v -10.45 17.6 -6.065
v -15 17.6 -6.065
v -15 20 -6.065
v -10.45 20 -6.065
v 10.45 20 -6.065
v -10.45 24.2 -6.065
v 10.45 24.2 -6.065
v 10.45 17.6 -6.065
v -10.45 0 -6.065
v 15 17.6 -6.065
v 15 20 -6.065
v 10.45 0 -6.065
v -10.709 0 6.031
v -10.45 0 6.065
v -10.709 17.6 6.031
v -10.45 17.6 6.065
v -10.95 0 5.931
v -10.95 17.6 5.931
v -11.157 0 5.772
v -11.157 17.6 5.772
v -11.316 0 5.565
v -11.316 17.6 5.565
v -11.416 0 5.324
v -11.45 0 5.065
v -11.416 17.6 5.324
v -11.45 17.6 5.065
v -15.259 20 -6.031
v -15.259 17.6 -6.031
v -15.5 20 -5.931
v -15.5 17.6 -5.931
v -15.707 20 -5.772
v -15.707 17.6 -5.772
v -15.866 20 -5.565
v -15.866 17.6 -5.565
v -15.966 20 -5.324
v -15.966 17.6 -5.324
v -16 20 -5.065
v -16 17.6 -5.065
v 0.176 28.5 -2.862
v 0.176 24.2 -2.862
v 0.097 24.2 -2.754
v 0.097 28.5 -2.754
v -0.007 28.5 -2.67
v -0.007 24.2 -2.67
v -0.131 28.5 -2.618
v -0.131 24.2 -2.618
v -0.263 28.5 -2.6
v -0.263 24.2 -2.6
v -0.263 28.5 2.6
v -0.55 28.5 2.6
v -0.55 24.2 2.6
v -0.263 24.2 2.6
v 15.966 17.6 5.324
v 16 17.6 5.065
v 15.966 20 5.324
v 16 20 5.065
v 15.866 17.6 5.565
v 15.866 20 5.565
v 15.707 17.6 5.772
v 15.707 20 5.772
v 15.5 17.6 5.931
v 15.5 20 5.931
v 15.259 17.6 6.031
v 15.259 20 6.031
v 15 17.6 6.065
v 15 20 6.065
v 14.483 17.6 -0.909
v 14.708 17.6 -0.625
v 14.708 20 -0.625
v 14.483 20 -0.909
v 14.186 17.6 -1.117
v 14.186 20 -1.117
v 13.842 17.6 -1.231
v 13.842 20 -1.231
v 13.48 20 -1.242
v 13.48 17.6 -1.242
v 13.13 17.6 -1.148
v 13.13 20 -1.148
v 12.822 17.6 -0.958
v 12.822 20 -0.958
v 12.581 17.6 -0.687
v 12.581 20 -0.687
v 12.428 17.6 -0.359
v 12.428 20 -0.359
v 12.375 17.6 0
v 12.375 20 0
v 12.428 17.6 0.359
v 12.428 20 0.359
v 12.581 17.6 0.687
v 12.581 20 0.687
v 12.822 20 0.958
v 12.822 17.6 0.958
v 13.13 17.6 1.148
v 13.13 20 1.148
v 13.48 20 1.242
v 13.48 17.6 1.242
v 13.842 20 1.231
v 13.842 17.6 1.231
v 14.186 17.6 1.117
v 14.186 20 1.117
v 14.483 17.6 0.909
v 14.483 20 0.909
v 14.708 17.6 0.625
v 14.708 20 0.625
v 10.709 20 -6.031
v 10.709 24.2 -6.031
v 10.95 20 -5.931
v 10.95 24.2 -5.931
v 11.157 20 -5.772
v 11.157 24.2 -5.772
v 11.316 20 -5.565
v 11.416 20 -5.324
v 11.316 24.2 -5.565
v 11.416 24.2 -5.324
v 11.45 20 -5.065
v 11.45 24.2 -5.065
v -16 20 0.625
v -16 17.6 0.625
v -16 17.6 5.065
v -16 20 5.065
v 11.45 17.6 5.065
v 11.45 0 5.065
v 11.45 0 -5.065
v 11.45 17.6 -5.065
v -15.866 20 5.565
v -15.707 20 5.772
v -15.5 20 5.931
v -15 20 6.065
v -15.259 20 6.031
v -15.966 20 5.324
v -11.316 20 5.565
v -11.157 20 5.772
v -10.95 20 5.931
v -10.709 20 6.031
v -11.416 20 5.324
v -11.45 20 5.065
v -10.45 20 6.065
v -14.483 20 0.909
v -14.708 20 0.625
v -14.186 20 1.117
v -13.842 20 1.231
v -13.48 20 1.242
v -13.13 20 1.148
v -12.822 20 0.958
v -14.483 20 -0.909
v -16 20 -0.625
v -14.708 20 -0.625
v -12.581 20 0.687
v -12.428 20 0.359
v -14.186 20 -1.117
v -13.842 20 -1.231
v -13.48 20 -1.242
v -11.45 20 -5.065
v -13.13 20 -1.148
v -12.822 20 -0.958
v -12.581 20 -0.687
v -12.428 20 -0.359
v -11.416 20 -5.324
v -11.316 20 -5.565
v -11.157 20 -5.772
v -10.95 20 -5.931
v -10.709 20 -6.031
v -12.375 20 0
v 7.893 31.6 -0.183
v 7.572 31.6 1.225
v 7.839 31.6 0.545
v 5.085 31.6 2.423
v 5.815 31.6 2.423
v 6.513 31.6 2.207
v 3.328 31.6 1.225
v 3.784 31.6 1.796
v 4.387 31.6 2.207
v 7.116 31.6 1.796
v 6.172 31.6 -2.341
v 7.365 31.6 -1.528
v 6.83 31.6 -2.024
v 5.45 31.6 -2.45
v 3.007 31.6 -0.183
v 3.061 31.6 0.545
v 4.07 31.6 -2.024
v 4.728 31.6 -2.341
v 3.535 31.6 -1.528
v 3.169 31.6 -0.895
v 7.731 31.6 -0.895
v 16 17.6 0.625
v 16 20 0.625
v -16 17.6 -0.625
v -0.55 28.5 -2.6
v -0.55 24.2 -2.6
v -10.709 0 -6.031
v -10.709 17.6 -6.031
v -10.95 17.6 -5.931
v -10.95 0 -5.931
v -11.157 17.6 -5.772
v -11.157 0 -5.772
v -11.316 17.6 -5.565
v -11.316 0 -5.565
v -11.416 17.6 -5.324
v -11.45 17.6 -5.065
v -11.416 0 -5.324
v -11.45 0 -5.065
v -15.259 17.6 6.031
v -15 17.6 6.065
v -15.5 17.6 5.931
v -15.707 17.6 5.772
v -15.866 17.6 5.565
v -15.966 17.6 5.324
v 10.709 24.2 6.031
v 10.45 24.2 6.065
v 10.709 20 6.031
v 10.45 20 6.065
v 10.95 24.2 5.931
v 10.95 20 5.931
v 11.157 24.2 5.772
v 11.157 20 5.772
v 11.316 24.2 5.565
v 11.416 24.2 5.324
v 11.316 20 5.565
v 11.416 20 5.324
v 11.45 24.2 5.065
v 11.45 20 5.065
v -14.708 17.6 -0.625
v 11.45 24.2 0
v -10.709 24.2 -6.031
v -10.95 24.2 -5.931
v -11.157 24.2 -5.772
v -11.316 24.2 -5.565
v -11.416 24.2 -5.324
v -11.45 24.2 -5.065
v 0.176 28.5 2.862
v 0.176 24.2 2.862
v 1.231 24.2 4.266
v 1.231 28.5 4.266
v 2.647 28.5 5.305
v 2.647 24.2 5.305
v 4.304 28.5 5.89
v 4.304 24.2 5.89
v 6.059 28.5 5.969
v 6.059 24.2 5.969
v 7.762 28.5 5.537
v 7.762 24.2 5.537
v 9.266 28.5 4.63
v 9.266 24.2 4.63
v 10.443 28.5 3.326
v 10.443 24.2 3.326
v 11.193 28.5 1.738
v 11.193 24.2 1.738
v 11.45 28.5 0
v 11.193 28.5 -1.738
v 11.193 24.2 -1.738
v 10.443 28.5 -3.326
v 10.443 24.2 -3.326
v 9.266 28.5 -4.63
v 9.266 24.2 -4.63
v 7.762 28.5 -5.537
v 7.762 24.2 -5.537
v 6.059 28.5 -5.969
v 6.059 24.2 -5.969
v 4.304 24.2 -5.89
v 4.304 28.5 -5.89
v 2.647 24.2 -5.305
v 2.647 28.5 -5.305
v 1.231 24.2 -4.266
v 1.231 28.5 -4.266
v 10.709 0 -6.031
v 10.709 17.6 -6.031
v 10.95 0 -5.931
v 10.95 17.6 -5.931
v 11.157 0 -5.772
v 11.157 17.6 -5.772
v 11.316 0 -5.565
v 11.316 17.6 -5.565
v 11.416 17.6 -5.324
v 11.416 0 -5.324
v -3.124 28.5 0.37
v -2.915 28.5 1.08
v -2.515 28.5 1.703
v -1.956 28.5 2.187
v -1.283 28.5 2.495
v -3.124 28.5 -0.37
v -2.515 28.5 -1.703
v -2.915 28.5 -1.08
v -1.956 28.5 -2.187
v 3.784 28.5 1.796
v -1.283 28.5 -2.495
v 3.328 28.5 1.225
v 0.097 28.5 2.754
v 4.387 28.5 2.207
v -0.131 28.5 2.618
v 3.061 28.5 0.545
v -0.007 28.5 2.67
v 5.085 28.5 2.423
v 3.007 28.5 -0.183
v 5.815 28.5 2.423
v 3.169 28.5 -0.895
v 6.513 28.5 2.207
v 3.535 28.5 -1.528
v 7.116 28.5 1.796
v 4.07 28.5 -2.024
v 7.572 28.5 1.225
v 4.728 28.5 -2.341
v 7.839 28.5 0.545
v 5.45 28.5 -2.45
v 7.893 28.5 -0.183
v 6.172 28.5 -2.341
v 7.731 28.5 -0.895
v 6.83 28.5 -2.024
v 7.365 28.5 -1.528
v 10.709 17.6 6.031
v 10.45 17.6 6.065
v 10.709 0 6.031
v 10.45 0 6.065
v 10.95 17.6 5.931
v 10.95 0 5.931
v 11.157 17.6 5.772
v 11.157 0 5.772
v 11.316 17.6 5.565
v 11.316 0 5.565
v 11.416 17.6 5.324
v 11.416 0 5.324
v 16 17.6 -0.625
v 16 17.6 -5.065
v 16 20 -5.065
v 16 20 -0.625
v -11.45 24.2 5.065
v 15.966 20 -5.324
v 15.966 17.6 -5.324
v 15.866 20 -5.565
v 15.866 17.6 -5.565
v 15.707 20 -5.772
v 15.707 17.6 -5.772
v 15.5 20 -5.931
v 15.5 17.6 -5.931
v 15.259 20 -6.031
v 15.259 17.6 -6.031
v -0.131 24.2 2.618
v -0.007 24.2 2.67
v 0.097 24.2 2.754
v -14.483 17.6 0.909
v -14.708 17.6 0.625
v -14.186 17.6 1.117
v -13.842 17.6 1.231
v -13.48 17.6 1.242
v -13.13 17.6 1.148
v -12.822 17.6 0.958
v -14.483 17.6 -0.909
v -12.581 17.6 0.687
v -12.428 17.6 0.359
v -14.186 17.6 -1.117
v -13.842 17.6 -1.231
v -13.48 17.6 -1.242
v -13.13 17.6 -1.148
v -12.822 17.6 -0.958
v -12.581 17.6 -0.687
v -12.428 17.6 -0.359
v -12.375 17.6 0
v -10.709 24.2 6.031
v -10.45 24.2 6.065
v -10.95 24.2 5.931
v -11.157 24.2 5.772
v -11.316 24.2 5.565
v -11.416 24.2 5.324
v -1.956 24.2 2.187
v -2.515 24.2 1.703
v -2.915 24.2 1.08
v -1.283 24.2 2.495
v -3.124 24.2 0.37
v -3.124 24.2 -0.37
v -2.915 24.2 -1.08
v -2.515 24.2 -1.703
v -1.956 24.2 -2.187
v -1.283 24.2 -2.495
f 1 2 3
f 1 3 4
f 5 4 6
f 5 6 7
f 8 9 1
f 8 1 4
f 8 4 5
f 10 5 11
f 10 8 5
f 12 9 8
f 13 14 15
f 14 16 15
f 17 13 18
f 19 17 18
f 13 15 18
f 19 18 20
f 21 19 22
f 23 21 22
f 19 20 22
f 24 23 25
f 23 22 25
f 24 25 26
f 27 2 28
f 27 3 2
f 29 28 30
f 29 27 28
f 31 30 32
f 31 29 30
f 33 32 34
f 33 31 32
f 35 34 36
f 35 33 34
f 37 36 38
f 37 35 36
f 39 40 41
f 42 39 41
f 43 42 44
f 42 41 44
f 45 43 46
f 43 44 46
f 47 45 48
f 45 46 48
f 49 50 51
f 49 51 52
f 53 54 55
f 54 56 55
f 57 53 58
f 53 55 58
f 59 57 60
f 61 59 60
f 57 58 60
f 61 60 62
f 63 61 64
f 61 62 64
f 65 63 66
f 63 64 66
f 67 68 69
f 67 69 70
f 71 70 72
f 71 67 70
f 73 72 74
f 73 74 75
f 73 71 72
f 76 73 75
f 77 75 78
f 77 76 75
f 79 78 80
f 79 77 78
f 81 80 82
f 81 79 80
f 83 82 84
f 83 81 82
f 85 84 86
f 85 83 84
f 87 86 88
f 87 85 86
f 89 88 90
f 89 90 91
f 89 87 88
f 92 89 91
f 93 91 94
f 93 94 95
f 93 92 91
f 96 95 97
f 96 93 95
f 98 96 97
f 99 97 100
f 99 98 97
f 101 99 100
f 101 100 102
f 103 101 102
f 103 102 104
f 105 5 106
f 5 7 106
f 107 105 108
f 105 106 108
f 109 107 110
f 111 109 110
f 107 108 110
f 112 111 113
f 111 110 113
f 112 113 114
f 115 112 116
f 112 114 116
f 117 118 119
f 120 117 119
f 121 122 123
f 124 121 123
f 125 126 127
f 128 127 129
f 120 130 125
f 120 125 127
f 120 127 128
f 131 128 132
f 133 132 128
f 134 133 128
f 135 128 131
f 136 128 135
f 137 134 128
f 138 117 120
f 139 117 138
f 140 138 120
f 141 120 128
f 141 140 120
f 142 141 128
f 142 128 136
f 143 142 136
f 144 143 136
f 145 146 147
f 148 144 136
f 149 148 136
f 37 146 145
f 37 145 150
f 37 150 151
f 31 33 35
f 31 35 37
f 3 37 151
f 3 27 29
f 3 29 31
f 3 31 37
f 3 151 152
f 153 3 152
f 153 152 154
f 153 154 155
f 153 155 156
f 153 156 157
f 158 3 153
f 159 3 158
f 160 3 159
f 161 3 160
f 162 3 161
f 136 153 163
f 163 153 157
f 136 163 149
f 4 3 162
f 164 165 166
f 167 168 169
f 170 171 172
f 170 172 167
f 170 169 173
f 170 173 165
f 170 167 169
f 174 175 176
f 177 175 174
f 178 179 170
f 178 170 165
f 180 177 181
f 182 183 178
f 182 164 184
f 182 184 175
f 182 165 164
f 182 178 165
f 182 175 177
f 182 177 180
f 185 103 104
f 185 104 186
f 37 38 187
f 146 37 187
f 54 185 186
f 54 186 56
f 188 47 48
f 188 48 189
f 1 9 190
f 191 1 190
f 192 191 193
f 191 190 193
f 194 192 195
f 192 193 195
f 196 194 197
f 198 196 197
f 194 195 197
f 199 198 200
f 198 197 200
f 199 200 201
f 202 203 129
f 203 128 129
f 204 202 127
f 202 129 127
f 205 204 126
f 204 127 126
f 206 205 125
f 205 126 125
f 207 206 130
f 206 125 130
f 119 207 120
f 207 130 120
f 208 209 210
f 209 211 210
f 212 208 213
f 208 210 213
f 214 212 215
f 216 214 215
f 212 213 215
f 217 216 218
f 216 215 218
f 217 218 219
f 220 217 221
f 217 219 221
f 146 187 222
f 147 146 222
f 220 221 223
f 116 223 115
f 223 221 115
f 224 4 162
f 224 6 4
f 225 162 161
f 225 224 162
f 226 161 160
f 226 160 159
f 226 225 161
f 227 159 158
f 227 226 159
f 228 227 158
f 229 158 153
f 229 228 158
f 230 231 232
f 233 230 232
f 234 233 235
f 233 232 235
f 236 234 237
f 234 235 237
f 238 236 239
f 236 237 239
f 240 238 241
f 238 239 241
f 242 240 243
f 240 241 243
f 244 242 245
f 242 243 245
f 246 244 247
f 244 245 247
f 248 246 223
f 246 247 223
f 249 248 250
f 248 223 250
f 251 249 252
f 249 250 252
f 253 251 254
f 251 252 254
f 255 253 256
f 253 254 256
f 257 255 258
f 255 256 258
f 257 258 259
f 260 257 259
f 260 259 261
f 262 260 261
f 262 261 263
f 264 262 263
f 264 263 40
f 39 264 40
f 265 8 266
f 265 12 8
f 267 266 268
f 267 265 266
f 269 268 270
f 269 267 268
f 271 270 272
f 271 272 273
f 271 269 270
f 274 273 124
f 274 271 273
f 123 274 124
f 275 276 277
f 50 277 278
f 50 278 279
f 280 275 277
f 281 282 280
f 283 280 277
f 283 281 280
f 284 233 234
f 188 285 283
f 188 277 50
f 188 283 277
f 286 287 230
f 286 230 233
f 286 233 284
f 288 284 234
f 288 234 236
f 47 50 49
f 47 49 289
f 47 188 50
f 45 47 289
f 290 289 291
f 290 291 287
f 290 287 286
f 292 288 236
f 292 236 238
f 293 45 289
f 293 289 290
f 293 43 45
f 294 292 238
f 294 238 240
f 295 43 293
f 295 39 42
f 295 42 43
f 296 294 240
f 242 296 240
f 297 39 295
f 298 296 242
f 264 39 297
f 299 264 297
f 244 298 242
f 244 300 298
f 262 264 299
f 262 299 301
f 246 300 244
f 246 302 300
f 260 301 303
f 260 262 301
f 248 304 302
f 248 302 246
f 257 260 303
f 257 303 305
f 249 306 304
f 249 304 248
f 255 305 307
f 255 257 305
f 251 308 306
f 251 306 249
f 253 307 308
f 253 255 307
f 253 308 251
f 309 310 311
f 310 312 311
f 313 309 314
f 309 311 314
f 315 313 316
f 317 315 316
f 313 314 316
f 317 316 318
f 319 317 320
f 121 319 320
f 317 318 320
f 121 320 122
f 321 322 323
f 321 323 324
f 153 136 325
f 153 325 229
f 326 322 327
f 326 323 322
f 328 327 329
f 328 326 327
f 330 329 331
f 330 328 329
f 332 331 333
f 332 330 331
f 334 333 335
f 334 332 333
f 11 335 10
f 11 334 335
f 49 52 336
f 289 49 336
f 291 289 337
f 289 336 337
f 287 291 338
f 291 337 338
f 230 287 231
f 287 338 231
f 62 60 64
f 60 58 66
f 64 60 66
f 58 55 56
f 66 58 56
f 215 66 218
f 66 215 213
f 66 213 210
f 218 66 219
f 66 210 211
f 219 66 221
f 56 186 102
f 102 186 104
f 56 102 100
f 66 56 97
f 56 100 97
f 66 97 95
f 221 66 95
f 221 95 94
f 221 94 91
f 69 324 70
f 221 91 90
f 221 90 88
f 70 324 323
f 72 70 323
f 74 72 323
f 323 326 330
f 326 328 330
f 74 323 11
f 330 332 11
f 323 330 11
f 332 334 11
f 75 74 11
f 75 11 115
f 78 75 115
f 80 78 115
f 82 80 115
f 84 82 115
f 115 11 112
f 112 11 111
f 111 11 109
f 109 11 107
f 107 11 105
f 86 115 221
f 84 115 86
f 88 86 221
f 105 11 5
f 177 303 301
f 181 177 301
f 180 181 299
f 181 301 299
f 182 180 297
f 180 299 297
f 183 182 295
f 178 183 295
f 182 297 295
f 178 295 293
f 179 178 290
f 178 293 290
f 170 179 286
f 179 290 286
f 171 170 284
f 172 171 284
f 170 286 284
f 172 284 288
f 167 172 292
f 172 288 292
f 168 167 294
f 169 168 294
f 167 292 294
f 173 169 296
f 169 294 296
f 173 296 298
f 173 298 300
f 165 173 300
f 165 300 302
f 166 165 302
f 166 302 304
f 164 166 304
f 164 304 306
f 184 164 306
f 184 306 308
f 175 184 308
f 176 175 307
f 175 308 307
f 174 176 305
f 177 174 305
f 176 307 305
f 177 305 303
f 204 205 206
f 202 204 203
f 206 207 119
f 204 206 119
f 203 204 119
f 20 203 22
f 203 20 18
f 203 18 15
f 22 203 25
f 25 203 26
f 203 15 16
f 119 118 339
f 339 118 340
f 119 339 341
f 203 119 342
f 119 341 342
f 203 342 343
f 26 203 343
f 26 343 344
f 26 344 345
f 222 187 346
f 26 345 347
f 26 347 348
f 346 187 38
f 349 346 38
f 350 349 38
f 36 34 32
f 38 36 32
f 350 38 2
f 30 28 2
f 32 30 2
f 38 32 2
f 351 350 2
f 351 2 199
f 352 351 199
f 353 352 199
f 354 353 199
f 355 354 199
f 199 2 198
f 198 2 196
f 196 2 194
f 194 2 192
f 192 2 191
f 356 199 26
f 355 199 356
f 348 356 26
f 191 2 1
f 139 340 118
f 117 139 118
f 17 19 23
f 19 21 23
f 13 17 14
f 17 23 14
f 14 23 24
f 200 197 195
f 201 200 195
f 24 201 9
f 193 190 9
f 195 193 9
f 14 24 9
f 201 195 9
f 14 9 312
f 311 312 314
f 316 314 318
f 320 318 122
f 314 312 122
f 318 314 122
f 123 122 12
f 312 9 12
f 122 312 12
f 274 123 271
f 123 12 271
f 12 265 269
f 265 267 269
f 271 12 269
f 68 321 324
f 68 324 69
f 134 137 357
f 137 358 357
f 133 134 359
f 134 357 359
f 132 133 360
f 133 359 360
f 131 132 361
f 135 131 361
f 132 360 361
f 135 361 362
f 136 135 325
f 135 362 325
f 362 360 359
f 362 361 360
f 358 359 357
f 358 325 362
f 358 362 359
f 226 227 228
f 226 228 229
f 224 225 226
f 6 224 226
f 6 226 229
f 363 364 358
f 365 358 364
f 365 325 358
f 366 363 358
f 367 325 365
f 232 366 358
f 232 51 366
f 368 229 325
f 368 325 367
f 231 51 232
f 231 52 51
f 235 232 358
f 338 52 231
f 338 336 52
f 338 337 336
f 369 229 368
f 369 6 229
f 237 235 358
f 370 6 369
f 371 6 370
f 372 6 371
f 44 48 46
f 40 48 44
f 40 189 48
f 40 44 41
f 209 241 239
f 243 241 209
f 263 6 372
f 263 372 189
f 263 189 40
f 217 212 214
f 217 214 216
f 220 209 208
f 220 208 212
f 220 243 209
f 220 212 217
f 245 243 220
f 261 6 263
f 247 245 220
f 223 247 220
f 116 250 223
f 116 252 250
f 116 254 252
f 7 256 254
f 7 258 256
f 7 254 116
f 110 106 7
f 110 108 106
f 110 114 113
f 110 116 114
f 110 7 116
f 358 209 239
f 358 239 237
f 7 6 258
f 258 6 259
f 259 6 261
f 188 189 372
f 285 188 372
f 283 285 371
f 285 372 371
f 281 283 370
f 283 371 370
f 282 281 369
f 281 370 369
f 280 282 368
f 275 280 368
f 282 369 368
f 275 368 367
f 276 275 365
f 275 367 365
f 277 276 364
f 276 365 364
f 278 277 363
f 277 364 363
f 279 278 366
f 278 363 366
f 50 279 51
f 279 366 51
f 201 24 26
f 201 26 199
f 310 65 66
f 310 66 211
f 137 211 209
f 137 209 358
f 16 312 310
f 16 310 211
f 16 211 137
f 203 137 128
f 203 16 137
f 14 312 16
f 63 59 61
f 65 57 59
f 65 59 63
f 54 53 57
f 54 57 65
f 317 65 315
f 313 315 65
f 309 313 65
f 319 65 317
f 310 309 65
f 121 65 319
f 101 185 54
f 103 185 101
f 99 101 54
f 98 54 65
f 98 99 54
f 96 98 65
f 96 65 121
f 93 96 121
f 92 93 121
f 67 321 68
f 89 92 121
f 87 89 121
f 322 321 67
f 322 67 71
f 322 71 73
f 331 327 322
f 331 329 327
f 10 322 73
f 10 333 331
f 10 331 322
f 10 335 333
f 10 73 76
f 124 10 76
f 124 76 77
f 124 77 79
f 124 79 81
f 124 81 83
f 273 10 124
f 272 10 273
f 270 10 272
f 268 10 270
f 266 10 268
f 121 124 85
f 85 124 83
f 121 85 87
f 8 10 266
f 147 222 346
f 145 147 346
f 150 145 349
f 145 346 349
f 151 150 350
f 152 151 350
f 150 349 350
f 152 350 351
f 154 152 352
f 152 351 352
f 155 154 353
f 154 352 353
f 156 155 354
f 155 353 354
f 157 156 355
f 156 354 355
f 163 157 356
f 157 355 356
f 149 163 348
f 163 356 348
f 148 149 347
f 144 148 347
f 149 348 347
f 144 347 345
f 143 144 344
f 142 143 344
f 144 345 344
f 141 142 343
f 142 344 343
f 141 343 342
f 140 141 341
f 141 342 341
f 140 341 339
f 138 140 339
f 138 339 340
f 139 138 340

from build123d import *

# Parameters (mm, degrees)
ESBO_O2_W                  = 22.9
ESBO_O2_H                  = 12.13
RESSALTO_EXTRUS_O1_DEPTH   = 17.35
ESBO_O3_W                  = 32
ESBO_O3_H                  = 12.13
RESSALTO_EXTRUS_O2_DEPTH   = 2.4
ESBO_O4_W                  = 22.9
ESBO_O4_H                  = 12.13
RESSALTO_EXTRUS_O3_DEPTH   = 4.45
CORTE_EXTRUS_O1_DEPTH      = 2.4
RESSALTO_EXTRUS_O4_DEPTH   = 4.3
ESBO_O7_R                  = 2.45
RESSALTO_EXTRUS_O5_DEPTH   = 3.1
CORTE_EXTRUS_O2_DEPTH      = 1
CORTE_EXTRUS_O2_DEPTH_BACK = 16
ESBO_O10_W                 = 9.190370446
ESBO_O10_H                 = 13.482765879
ESBO_O10_W_2               = 7.294178248
ESBO_O10_H_2               = 14.557386271
RESSALTO_EXTRUS_O7_DEPTH   = 2.4
FILETE1_R                  = 1


with BuildPart() as part:
    # Esboço2 → Ressalto-extrusão1 (new body)
    with BuildSketch(Plane(origin=(0, 0, 0), x_dir=(1, 0, 0), z_dir=(0, 1, 0))):
        Rectangle(ESBO_O2_W, ESBO_O2_H)
    extrude(amount=RESSALTO_EXTRUS_O1_DEPTH)

    # Esboço3 → Ressalto-extrusão2 (add)
    with BuildSketch(Plane(origin=(0, 17.35, 0), x_dir=(1, 0, 0), z_dir=(0, 1, 0))):
        Rectangle(ESBO_O3_W, ESBO_O3_H)
    extrude(amount=RESSALTO_EXTRUS_O2_DEPTH)

    # Esboço4 → Ressalto-extrusão3 (add)
    with BuildSketch(Plane(origin=(0, 19.75, 0), x_dir=(1, 0, 0), z_dir=(0, 1, 0))):
        Rectangle(ESBO_O4_W, ESBO_O4_H)
    extrude(amount=RESSALTO_EXTRUS_O3_DEPTH)

    # Esboço5 → Corte-extrusão1 (cut)
    with BuildSketch(Plane(origin=(0, 19.75, 0), x_dir=(1, 0, 0), z_dir=(0, 1, 0))):
        with BuildLine():
            Line((-16, -0.625), (-16, 0.625))
            Line((-16, 0.625), (-14.707531755, 0.625))
            ThreePointArc((-14.707531755, 0.625), (-12.375, 0), (-14.707531755, -0.625))
            Line((-14.707531755, -0.625), (-16, -0.625))
        make_face()
        with BuildLine():
            Line((14.707531755, -0.625), (16, -0.625))
            Line((16, -0.625), (16, 0.625))
            Line((16, 0.625), (14.707531755, 0.625))
            ThreePointArc((14.707531755, 0.625), (12.375, 0), (14.707531755, -0.625))
        make_face()
    extrude(amount=-CORTE_EXTRUS_O1_DEPTH, mode=Mode.SUBTRACT)

    # Esboço6 → Ressalto-extrusão4 (add)
    with BuildSketch(Plane(origin=(0, 24.2, 0), x_dir=(1, 0, 0), z_dir=(0, 1, 0))):
        with BuildLine():
            Line((-0.55, -2.6), (-0.263142743, -2.6))
            ThreePointArc((-0.263142743, -2.6), (-0.007438587, -2.670331076), (0.176329776, -2.861538462))
            ThreePointArc((0.176329776, -2.861538462), (11.45, 0), (0.176329776, 2.861538462))
            ThreePointArc((0.176329776, 2.861538462), (-0.007438587, 2.670331076), (-0.263142743, 2.6))
            Line((-0.263142743, 2.6), (-0.55, 2.6))
            ThreePointArc((-0.55, 2.6), (-3.15, 0), (-0.55, -2.6))
        make_face()
    extrude(amount=RESSALTO_EXTRUS_O4_DEPTH)

    # Esboço7 → Ressalto-extrusão5 (add)
    with BuildSketch(Plane(origin=(0, 28.5, 0), x_dir=(1, 0, 0), z_dir=(0, 1, 0))):
        with Locations(Location((5.45, 0, 0), (0, 0, 90))):
            Circle(ESBO_O7_R)
    extrude(amount=RESSALTO_EXTRUS_O5_DEPTH)

    # Esboço10 → Corte-extrusão2 (cut, two sides: drawn at the far end of the back side and taken through both)
    with BuildSketch(Plane(origin=(0, 28.5, 0), x_dir=(1, 0, 0), z_dir=(0, 1, 0)).offset(-CORTE_EXTRUS_O2_DEPTH_BACK)):
        with Locations((16.045185223, -0.676382939)):
            Rectangle(ESBO_O10_W, ESBO_O10_H)
        with Locations((-15.097089124, -1.213693136)):
            Rectangle(ESBO_O10_W_2, ESBO_O10_H_2)
    extrude(amount=CORTE_EXTRUS_O2_DEPTH + CORTE_EXTRUS_O2_DEPTH_BACK, mode=Mode.SUBTRACT)

    # Esboço12 → Ressalto-extrusão7 (add)
    with BuildSketch(Plane(origin=(0, 17.6, 0), x_dir=(1, 0, 0), z_dir=(0, 1, 0))):
        with BuildLine():
            Line((16, 0.625), (14.707531755, 0.625))
            ThreePointArc((14.707531755, 0.625), (12.375, 0), (14.707531755, -0.625))
            Line((14.707531755, -0.625), (16, -0.625))
            Line((16, -0.625), (16, -6.065))
            Line((16, -6.065), (11.45, -6.065))
            Line((11.45, -6.065), (11.45, 6.065))
            Line((11.45, 6.065), (16, 6.065))
            Line((16, 6.065), (16, 0.625))
        make_face()
        with BuildLine():
            Line((-16, -0.625), (-16, -6.065))
            Line((-16, -6.065), (-11.45, -6.065))
            Line((-11.45, -6.065), (-11.45, 6.065))
            Line((-11.45, 6.065), (-16, 6.065))
            Line((-16, 6.065), (-16, 0.625))
            Line((-16, 0.625), (-14.707531755, 0.625))
            ThreePointArc((-14.707531755, 0.625), (-12.375, 0), (-14.707531755, -0.625))
            Line((-14.707531755, -0.625), (-16, -0.625))
        make_face()
    extrude(amount=RESSALTO_EXTRUS_O7_DEPTH)

    # Filete1
    filete1_edges = [part.edges().sort_by_distance(p)[0] for p in [
        (11.45, 8.8, 6.065),
        (11.45, 8.8, -6.065),
        (16, 18.8, -6.065),
        (16, 18.8, 6.065),
        (-11.45, 8.8, 6.065),
        (-11.45, 8.8, -6.065),
        (-16, 18.8, 6.065),
        (-16, 18.8, -6.065),
        (-11.45, 22.1, -6.065),
        (11.45, 22.1, -6.065),
        (11.45, 22.1, 6.065),
        (-11.45, 22.1, 6.065),
    ]]
    fillet(filete1_edges, radius=FILETE1_R)


solid = part.part
